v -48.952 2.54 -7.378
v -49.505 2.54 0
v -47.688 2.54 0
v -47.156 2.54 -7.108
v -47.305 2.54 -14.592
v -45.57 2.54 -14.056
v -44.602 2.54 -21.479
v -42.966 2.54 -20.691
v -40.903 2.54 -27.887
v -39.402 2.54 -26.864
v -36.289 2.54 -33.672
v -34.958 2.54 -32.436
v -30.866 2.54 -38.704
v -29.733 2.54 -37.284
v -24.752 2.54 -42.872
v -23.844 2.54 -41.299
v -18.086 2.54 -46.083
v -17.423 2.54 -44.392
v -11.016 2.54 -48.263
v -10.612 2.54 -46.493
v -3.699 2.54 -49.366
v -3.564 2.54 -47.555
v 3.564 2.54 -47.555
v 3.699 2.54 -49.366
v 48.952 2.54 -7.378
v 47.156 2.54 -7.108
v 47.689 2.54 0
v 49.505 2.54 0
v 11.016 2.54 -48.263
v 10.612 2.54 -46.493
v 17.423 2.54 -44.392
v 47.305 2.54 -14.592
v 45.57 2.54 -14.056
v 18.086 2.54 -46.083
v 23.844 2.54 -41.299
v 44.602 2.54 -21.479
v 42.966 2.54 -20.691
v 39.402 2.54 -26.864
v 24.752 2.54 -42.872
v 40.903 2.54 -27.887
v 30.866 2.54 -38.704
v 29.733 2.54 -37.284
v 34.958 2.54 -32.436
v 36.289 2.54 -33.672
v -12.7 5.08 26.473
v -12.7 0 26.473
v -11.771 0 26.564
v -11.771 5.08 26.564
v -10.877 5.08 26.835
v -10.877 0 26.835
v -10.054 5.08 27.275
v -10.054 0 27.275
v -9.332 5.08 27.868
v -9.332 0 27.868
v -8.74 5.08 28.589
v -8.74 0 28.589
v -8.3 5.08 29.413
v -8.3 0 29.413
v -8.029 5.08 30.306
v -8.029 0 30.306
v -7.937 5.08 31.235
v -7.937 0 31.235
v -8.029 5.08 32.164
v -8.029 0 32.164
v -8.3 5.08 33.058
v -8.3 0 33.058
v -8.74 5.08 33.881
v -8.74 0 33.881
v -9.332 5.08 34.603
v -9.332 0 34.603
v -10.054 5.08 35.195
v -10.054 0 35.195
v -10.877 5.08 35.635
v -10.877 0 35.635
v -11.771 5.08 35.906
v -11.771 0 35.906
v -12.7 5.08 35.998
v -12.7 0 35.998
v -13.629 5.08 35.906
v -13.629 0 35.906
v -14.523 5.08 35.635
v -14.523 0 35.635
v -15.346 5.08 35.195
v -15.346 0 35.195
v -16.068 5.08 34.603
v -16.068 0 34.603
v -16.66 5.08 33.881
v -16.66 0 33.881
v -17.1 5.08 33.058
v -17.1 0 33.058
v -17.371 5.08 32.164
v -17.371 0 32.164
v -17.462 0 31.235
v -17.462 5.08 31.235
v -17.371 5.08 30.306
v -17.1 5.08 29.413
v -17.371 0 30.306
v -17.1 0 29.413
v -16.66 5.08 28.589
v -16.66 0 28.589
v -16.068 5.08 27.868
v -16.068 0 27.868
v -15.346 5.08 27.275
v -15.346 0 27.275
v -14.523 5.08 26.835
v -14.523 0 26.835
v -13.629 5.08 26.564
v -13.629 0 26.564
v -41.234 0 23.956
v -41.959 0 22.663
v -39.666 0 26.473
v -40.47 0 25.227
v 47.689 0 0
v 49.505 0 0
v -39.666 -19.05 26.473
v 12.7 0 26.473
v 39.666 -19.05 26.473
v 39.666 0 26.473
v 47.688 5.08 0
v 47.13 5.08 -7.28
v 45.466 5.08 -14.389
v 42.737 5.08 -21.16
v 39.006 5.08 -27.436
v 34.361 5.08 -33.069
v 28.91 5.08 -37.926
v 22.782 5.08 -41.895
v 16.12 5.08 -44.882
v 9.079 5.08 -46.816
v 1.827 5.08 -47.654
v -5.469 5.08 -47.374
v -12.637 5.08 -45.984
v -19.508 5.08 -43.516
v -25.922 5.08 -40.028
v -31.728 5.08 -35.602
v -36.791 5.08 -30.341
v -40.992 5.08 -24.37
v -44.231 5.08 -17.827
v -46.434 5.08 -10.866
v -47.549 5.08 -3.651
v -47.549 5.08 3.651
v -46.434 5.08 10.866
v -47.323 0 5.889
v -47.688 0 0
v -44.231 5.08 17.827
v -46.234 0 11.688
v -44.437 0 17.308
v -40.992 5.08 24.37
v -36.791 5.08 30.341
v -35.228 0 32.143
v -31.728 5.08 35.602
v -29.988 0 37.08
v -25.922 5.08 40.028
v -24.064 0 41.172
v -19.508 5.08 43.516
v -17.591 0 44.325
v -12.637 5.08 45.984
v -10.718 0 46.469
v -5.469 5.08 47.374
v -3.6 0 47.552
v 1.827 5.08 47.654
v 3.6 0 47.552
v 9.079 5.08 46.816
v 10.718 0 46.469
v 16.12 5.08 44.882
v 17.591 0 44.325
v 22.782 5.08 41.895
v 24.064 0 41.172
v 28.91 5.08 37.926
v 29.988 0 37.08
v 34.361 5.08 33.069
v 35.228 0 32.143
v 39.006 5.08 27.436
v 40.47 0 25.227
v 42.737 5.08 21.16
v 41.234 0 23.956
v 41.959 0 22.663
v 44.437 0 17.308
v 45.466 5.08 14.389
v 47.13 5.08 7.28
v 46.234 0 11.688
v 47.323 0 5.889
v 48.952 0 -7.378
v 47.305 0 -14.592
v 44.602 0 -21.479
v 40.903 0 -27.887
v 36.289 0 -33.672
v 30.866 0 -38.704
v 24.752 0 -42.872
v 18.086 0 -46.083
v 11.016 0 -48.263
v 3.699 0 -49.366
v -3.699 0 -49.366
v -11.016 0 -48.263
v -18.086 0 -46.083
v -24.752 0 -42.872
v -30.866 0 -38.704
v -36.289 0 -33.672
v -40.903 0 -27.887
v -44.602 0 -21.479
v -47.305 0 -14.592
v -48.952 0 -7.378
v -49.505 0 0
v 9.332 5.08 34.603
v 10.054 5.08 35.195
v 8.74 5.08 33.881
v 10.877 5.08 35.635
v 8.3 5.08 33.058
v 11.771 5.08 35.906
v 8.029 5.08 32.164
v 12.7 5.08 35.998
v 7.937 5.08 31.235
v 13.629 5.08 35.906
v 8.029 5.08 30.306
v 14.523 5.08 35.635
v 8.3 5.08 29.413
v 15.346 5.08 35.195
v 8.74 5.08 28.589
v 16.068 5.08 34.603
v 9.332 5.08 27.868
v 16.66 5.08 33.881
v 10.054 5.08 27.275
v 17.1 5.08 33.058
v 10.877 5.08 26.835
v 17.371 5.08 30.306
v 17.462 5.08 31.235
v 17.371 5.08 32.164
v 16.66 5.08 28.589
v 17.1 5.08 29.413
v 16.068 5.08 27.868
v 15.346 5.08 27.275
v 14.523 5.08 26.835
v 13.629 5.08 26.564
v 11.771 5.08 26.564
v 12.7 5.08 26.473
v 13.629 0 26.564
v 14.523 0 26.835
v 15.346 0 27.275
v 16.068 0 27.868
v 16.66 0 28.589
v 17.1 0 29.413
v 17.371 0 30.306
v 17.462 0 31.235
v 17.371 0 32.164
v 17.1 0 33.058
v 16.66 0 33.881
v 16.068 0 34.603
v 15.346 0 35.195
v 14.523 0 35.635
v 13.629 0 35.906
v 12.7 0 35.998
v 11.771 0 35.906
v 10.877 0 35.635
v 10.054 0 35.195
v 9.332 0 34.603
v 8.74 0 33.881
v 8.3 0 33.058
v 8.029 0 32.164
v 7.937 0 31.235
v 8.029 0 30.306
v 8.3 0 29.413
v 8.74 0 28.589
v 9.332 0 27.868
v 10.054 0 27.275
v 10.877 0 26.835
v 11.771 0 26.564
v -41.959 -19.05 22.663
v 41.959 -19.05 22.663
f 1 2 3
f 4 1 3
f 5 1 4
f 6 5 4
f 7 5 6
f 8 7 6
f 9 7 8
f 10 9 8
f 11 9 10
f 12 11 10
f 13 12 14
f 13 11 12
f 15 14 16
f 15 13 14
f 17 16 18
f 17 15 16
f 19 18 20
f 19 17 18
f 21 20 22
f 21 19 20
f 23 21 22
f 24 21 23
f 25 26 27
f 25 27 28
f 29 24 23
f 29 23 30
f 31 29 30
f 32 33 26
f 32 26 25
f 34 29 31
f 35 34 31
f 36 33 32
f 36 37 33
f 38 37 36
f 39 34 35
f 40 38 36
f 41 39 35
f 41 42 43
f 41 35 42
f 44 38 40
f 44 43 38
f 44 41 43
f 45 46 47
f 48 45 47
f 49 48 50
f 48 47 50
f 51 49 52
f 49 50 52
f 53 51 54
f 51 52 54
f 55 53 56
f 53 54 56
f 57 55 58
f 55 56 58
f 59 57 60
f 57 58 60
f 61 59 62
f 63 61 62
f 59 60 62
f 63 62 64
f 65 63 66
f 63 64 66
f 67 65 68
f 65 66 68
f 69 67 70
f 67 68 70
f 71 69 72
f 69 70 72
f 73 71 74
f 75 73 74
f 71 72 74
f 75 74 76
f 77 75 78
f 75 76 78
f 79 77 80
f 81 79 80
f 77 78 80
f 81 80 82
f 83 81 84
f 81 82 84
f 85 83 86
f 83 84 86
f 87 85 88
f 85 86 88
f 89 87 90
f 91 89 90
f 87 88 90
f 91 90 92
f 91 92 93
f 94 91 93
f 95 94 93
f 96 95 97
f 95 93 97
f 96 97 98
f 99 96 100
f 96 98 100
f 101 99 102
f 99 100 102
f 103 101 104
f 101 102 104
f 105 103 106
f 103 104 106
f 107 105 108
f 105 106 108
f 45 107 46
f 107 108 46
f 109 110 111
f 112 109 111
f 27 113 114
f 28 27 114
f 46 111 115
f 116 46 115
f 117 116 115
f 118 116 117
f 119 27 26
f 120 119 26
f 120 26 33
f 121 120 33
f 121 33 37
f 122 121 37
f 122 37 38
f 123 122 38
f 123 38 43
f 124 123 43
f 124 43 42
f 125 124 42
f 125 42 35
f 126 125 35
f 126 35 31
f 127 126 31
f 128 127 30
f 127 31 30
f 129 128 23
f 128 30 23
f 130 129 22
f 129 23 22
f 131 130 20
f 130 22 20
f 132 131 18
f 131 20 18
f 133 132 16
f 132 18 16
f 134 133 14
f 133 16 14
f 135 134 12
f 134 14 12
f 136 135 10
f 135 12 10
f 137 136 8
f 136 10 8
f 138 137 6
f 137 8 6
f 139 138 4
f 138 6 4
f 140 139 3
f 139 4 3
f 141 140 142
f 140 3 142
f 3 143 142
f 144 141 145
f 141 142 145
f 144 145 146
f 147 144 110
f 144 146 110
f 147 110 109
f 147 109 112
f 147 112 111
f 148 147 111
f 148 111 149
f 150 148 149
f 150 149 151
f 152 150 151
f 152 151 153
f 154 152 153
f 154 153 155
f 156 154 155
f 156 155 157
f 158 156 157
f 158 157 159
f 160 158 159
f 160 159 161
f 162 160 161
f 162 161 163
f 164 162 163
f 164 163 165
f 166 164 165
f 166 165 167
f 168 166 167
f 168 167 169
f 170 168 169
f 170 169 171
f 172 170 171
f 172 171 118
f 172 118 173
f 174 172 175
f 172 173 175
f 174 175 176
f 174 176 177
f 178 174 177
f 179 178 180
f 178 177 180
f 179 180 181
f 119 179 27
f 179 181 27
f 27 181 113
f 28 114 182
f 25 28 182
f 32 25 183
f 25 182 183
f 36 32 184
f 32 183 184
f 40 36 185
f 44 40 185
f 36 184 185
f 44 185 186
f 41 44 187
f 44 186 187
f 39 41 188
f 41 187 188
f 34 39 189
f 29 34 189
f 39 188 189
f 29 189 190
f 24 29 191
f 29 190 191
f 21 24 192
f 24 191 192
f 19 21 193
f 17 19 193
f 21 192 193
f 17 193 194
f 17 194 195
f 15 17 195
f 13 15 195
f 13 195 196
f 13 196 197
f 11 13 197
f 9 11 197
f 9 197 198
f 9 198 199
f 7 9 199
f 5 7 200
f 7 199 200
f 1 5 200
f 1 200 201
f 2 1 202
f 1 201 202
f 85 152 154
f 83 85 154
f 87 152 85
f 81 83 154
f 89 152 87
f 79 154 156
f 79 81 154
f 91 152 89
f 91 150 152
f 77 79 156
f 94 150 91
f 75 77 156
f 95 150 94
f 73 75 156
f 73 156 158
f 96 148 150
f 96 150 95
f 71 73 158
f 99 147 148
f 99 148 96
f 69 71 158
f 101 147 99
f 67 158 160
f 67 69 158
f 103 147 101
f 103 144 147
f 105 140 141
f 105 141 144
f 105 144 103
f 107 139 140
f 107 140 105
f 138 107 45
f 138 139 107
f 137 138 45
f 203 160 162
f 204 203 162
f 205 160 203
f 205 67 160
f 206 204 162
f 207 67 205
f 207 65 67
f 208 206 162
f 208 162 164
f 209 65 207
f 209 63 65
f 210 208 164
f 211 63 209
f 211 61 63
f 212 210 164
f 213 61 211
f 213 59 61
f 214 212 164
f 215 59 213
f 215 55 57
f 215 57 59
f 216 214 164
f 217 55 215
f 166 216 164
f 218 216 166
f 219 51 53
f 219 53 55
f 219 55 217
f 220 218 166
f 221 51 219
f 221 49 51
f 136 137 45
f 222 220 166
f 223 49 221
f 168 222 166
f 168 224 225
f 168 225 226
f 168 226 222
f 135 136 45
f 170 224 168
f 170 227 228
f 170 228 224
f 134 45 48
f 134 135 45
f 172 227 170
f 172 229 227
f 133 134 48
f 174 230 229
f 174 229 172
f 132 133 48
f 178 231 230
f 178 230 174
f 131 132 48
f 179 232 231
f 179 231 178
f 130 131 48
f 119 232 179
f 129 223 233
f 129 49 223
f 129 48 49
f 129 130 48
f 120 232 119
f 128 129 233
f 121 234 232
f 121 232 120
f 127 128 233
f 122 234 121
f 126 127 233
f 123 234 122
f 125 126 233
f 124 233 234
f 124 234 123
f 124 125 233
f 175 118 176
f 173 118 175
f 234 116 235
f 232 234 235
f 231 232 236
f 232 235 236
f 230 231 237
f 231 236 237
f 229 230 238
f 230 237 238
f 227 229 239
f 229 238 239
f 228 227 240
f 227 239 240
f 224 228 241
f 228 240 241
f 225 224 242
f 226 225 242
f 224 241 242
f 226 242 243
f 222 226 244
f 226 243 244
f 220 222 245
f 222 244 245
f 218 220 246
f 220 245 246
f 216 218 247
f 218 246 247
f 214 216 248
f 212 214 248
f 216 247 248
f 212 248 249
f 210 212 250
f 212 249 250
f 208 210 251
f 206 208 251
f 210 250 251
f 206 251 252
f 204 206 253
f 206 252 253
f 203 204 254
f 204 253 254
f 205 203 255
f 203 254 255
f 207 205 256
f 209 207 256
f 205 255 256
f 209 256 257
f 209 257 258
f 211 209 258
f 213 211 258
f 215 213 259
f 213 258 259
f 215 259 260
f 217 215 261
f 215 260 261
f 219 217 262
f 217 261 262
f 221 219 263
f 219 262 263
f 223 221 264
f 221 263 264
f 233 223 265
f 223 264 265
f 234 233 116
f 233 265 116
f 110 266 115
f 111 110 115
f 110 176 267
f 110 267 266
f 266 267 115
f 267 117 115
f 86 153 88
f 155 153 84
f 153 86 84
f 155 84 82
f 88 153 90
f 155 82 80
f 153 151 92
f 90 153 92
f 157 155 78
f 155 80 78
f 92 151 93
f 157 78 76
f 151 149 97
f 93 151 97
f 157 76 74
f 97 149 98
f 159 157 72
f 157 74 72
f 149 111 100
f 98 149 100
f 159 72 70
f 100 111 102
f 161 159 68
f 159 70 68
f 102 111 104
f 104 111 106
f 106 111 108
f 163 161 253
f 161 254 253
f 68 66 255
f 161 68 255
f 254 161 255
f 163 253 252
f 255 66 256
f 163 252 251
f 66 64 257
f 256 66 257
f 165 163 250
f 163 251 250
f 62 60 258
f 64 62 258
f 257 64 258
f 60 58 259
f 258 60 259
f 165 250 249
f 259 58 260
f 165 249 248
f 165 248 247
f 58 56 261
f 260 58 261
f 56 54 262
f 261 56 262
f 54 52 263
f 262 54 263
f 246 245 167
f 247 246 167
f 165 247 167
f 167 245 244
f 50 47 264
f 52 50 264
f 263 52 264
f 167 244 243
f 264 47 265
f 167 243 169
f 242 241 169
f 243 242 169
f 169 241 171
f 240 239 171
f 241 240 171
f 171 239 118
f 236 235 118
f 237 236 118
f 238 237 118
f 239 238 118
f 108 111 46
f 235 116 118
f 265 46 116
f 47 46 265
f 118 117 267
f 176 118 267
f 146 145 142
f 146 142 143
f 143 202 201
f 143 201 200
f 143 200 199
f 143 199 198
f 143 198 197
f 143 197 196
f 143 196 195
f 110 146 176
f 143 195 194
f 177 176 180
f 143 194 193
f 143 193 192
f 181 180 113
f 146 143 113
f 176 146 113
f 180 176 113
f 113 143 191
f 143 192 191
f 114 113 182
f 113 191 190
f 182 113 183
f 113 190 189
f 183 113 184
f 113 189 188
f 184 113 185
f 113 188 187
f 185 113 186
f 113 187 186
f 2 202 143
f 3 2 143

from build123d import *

# Parameters (mm, degrees)
BOSS_EXTRUDE1_DEPTH = 2.54
SKETCH2_R           = 47.6885
BOSS_EXTRUDE2_DEPTH = 2.54
SKETCH3_R           = 4.7625
CUT_EXTRUDE1_DEPTH  = 5.08
BOSS_EXTRUDE4_DEPTH = 19.05


with BuildPart() as part:
    # Sketch1 → Boss-Extrude1 (new body)
    with BuildSketch(Plane(origin=(0, 0, 0), x_dir=(1, 0, 0), z_dir=(0, 1, 0))):
        with BuildLine():
            Line((-49.5046, 0), (-47.6885, 0))
            ThreePointArc((-47.6885, 0), (0, -47.6885), (47.6885, 0))
            Line((47.6885, 0), (49.5046, 0))
            ThreePointArc((49.5046, 0), (0, 49.5046), (-49.5046, 0))
        make_face()
    extrude(amount=BOSS_EXTRUDE1_DEPTH)

    # Sketch2 → Boss-Extrude2 (add)
    with BuildSketch(Plane(origin=(0, 2.54, 0), x_dir=(1, 0, 0), z_dir=(0, 1, 0))):
        Circle(SKETCH2_R)
    extrude(amount=BOSS_EXTRUDE2_DEPTH)

    # Sketch3 → Cut-Extrude1 (cut)
    with BuildSketch(Plane.XZ):
        with Locations(Location((12.7, 31.235352443, 0), (0, 0, 270))):
            Circle(SKETCH3_R)
        with Locations(Location((-12.7, 31.235352443, 0), (0, 0, 270))):
            Circle(SKETCH3_R)
    extrude(amount=-CUT_EXTRUDE1_DEPTH, mode=Mode.SUBTRACT)

    # Sketch4 → Boss-Extrude4 (add)
    with BuildSketch(Plane.XZ):
        Polygon((41.959363096, 22.662852443), (-41.959363096, 22.662852443), (-39.665868398, 26.472852443), (39.665868398, 26.472852443), align=None)
    extrude(amount=BOSS_EXTRUDE4_DEPTH)


solid = part.part
